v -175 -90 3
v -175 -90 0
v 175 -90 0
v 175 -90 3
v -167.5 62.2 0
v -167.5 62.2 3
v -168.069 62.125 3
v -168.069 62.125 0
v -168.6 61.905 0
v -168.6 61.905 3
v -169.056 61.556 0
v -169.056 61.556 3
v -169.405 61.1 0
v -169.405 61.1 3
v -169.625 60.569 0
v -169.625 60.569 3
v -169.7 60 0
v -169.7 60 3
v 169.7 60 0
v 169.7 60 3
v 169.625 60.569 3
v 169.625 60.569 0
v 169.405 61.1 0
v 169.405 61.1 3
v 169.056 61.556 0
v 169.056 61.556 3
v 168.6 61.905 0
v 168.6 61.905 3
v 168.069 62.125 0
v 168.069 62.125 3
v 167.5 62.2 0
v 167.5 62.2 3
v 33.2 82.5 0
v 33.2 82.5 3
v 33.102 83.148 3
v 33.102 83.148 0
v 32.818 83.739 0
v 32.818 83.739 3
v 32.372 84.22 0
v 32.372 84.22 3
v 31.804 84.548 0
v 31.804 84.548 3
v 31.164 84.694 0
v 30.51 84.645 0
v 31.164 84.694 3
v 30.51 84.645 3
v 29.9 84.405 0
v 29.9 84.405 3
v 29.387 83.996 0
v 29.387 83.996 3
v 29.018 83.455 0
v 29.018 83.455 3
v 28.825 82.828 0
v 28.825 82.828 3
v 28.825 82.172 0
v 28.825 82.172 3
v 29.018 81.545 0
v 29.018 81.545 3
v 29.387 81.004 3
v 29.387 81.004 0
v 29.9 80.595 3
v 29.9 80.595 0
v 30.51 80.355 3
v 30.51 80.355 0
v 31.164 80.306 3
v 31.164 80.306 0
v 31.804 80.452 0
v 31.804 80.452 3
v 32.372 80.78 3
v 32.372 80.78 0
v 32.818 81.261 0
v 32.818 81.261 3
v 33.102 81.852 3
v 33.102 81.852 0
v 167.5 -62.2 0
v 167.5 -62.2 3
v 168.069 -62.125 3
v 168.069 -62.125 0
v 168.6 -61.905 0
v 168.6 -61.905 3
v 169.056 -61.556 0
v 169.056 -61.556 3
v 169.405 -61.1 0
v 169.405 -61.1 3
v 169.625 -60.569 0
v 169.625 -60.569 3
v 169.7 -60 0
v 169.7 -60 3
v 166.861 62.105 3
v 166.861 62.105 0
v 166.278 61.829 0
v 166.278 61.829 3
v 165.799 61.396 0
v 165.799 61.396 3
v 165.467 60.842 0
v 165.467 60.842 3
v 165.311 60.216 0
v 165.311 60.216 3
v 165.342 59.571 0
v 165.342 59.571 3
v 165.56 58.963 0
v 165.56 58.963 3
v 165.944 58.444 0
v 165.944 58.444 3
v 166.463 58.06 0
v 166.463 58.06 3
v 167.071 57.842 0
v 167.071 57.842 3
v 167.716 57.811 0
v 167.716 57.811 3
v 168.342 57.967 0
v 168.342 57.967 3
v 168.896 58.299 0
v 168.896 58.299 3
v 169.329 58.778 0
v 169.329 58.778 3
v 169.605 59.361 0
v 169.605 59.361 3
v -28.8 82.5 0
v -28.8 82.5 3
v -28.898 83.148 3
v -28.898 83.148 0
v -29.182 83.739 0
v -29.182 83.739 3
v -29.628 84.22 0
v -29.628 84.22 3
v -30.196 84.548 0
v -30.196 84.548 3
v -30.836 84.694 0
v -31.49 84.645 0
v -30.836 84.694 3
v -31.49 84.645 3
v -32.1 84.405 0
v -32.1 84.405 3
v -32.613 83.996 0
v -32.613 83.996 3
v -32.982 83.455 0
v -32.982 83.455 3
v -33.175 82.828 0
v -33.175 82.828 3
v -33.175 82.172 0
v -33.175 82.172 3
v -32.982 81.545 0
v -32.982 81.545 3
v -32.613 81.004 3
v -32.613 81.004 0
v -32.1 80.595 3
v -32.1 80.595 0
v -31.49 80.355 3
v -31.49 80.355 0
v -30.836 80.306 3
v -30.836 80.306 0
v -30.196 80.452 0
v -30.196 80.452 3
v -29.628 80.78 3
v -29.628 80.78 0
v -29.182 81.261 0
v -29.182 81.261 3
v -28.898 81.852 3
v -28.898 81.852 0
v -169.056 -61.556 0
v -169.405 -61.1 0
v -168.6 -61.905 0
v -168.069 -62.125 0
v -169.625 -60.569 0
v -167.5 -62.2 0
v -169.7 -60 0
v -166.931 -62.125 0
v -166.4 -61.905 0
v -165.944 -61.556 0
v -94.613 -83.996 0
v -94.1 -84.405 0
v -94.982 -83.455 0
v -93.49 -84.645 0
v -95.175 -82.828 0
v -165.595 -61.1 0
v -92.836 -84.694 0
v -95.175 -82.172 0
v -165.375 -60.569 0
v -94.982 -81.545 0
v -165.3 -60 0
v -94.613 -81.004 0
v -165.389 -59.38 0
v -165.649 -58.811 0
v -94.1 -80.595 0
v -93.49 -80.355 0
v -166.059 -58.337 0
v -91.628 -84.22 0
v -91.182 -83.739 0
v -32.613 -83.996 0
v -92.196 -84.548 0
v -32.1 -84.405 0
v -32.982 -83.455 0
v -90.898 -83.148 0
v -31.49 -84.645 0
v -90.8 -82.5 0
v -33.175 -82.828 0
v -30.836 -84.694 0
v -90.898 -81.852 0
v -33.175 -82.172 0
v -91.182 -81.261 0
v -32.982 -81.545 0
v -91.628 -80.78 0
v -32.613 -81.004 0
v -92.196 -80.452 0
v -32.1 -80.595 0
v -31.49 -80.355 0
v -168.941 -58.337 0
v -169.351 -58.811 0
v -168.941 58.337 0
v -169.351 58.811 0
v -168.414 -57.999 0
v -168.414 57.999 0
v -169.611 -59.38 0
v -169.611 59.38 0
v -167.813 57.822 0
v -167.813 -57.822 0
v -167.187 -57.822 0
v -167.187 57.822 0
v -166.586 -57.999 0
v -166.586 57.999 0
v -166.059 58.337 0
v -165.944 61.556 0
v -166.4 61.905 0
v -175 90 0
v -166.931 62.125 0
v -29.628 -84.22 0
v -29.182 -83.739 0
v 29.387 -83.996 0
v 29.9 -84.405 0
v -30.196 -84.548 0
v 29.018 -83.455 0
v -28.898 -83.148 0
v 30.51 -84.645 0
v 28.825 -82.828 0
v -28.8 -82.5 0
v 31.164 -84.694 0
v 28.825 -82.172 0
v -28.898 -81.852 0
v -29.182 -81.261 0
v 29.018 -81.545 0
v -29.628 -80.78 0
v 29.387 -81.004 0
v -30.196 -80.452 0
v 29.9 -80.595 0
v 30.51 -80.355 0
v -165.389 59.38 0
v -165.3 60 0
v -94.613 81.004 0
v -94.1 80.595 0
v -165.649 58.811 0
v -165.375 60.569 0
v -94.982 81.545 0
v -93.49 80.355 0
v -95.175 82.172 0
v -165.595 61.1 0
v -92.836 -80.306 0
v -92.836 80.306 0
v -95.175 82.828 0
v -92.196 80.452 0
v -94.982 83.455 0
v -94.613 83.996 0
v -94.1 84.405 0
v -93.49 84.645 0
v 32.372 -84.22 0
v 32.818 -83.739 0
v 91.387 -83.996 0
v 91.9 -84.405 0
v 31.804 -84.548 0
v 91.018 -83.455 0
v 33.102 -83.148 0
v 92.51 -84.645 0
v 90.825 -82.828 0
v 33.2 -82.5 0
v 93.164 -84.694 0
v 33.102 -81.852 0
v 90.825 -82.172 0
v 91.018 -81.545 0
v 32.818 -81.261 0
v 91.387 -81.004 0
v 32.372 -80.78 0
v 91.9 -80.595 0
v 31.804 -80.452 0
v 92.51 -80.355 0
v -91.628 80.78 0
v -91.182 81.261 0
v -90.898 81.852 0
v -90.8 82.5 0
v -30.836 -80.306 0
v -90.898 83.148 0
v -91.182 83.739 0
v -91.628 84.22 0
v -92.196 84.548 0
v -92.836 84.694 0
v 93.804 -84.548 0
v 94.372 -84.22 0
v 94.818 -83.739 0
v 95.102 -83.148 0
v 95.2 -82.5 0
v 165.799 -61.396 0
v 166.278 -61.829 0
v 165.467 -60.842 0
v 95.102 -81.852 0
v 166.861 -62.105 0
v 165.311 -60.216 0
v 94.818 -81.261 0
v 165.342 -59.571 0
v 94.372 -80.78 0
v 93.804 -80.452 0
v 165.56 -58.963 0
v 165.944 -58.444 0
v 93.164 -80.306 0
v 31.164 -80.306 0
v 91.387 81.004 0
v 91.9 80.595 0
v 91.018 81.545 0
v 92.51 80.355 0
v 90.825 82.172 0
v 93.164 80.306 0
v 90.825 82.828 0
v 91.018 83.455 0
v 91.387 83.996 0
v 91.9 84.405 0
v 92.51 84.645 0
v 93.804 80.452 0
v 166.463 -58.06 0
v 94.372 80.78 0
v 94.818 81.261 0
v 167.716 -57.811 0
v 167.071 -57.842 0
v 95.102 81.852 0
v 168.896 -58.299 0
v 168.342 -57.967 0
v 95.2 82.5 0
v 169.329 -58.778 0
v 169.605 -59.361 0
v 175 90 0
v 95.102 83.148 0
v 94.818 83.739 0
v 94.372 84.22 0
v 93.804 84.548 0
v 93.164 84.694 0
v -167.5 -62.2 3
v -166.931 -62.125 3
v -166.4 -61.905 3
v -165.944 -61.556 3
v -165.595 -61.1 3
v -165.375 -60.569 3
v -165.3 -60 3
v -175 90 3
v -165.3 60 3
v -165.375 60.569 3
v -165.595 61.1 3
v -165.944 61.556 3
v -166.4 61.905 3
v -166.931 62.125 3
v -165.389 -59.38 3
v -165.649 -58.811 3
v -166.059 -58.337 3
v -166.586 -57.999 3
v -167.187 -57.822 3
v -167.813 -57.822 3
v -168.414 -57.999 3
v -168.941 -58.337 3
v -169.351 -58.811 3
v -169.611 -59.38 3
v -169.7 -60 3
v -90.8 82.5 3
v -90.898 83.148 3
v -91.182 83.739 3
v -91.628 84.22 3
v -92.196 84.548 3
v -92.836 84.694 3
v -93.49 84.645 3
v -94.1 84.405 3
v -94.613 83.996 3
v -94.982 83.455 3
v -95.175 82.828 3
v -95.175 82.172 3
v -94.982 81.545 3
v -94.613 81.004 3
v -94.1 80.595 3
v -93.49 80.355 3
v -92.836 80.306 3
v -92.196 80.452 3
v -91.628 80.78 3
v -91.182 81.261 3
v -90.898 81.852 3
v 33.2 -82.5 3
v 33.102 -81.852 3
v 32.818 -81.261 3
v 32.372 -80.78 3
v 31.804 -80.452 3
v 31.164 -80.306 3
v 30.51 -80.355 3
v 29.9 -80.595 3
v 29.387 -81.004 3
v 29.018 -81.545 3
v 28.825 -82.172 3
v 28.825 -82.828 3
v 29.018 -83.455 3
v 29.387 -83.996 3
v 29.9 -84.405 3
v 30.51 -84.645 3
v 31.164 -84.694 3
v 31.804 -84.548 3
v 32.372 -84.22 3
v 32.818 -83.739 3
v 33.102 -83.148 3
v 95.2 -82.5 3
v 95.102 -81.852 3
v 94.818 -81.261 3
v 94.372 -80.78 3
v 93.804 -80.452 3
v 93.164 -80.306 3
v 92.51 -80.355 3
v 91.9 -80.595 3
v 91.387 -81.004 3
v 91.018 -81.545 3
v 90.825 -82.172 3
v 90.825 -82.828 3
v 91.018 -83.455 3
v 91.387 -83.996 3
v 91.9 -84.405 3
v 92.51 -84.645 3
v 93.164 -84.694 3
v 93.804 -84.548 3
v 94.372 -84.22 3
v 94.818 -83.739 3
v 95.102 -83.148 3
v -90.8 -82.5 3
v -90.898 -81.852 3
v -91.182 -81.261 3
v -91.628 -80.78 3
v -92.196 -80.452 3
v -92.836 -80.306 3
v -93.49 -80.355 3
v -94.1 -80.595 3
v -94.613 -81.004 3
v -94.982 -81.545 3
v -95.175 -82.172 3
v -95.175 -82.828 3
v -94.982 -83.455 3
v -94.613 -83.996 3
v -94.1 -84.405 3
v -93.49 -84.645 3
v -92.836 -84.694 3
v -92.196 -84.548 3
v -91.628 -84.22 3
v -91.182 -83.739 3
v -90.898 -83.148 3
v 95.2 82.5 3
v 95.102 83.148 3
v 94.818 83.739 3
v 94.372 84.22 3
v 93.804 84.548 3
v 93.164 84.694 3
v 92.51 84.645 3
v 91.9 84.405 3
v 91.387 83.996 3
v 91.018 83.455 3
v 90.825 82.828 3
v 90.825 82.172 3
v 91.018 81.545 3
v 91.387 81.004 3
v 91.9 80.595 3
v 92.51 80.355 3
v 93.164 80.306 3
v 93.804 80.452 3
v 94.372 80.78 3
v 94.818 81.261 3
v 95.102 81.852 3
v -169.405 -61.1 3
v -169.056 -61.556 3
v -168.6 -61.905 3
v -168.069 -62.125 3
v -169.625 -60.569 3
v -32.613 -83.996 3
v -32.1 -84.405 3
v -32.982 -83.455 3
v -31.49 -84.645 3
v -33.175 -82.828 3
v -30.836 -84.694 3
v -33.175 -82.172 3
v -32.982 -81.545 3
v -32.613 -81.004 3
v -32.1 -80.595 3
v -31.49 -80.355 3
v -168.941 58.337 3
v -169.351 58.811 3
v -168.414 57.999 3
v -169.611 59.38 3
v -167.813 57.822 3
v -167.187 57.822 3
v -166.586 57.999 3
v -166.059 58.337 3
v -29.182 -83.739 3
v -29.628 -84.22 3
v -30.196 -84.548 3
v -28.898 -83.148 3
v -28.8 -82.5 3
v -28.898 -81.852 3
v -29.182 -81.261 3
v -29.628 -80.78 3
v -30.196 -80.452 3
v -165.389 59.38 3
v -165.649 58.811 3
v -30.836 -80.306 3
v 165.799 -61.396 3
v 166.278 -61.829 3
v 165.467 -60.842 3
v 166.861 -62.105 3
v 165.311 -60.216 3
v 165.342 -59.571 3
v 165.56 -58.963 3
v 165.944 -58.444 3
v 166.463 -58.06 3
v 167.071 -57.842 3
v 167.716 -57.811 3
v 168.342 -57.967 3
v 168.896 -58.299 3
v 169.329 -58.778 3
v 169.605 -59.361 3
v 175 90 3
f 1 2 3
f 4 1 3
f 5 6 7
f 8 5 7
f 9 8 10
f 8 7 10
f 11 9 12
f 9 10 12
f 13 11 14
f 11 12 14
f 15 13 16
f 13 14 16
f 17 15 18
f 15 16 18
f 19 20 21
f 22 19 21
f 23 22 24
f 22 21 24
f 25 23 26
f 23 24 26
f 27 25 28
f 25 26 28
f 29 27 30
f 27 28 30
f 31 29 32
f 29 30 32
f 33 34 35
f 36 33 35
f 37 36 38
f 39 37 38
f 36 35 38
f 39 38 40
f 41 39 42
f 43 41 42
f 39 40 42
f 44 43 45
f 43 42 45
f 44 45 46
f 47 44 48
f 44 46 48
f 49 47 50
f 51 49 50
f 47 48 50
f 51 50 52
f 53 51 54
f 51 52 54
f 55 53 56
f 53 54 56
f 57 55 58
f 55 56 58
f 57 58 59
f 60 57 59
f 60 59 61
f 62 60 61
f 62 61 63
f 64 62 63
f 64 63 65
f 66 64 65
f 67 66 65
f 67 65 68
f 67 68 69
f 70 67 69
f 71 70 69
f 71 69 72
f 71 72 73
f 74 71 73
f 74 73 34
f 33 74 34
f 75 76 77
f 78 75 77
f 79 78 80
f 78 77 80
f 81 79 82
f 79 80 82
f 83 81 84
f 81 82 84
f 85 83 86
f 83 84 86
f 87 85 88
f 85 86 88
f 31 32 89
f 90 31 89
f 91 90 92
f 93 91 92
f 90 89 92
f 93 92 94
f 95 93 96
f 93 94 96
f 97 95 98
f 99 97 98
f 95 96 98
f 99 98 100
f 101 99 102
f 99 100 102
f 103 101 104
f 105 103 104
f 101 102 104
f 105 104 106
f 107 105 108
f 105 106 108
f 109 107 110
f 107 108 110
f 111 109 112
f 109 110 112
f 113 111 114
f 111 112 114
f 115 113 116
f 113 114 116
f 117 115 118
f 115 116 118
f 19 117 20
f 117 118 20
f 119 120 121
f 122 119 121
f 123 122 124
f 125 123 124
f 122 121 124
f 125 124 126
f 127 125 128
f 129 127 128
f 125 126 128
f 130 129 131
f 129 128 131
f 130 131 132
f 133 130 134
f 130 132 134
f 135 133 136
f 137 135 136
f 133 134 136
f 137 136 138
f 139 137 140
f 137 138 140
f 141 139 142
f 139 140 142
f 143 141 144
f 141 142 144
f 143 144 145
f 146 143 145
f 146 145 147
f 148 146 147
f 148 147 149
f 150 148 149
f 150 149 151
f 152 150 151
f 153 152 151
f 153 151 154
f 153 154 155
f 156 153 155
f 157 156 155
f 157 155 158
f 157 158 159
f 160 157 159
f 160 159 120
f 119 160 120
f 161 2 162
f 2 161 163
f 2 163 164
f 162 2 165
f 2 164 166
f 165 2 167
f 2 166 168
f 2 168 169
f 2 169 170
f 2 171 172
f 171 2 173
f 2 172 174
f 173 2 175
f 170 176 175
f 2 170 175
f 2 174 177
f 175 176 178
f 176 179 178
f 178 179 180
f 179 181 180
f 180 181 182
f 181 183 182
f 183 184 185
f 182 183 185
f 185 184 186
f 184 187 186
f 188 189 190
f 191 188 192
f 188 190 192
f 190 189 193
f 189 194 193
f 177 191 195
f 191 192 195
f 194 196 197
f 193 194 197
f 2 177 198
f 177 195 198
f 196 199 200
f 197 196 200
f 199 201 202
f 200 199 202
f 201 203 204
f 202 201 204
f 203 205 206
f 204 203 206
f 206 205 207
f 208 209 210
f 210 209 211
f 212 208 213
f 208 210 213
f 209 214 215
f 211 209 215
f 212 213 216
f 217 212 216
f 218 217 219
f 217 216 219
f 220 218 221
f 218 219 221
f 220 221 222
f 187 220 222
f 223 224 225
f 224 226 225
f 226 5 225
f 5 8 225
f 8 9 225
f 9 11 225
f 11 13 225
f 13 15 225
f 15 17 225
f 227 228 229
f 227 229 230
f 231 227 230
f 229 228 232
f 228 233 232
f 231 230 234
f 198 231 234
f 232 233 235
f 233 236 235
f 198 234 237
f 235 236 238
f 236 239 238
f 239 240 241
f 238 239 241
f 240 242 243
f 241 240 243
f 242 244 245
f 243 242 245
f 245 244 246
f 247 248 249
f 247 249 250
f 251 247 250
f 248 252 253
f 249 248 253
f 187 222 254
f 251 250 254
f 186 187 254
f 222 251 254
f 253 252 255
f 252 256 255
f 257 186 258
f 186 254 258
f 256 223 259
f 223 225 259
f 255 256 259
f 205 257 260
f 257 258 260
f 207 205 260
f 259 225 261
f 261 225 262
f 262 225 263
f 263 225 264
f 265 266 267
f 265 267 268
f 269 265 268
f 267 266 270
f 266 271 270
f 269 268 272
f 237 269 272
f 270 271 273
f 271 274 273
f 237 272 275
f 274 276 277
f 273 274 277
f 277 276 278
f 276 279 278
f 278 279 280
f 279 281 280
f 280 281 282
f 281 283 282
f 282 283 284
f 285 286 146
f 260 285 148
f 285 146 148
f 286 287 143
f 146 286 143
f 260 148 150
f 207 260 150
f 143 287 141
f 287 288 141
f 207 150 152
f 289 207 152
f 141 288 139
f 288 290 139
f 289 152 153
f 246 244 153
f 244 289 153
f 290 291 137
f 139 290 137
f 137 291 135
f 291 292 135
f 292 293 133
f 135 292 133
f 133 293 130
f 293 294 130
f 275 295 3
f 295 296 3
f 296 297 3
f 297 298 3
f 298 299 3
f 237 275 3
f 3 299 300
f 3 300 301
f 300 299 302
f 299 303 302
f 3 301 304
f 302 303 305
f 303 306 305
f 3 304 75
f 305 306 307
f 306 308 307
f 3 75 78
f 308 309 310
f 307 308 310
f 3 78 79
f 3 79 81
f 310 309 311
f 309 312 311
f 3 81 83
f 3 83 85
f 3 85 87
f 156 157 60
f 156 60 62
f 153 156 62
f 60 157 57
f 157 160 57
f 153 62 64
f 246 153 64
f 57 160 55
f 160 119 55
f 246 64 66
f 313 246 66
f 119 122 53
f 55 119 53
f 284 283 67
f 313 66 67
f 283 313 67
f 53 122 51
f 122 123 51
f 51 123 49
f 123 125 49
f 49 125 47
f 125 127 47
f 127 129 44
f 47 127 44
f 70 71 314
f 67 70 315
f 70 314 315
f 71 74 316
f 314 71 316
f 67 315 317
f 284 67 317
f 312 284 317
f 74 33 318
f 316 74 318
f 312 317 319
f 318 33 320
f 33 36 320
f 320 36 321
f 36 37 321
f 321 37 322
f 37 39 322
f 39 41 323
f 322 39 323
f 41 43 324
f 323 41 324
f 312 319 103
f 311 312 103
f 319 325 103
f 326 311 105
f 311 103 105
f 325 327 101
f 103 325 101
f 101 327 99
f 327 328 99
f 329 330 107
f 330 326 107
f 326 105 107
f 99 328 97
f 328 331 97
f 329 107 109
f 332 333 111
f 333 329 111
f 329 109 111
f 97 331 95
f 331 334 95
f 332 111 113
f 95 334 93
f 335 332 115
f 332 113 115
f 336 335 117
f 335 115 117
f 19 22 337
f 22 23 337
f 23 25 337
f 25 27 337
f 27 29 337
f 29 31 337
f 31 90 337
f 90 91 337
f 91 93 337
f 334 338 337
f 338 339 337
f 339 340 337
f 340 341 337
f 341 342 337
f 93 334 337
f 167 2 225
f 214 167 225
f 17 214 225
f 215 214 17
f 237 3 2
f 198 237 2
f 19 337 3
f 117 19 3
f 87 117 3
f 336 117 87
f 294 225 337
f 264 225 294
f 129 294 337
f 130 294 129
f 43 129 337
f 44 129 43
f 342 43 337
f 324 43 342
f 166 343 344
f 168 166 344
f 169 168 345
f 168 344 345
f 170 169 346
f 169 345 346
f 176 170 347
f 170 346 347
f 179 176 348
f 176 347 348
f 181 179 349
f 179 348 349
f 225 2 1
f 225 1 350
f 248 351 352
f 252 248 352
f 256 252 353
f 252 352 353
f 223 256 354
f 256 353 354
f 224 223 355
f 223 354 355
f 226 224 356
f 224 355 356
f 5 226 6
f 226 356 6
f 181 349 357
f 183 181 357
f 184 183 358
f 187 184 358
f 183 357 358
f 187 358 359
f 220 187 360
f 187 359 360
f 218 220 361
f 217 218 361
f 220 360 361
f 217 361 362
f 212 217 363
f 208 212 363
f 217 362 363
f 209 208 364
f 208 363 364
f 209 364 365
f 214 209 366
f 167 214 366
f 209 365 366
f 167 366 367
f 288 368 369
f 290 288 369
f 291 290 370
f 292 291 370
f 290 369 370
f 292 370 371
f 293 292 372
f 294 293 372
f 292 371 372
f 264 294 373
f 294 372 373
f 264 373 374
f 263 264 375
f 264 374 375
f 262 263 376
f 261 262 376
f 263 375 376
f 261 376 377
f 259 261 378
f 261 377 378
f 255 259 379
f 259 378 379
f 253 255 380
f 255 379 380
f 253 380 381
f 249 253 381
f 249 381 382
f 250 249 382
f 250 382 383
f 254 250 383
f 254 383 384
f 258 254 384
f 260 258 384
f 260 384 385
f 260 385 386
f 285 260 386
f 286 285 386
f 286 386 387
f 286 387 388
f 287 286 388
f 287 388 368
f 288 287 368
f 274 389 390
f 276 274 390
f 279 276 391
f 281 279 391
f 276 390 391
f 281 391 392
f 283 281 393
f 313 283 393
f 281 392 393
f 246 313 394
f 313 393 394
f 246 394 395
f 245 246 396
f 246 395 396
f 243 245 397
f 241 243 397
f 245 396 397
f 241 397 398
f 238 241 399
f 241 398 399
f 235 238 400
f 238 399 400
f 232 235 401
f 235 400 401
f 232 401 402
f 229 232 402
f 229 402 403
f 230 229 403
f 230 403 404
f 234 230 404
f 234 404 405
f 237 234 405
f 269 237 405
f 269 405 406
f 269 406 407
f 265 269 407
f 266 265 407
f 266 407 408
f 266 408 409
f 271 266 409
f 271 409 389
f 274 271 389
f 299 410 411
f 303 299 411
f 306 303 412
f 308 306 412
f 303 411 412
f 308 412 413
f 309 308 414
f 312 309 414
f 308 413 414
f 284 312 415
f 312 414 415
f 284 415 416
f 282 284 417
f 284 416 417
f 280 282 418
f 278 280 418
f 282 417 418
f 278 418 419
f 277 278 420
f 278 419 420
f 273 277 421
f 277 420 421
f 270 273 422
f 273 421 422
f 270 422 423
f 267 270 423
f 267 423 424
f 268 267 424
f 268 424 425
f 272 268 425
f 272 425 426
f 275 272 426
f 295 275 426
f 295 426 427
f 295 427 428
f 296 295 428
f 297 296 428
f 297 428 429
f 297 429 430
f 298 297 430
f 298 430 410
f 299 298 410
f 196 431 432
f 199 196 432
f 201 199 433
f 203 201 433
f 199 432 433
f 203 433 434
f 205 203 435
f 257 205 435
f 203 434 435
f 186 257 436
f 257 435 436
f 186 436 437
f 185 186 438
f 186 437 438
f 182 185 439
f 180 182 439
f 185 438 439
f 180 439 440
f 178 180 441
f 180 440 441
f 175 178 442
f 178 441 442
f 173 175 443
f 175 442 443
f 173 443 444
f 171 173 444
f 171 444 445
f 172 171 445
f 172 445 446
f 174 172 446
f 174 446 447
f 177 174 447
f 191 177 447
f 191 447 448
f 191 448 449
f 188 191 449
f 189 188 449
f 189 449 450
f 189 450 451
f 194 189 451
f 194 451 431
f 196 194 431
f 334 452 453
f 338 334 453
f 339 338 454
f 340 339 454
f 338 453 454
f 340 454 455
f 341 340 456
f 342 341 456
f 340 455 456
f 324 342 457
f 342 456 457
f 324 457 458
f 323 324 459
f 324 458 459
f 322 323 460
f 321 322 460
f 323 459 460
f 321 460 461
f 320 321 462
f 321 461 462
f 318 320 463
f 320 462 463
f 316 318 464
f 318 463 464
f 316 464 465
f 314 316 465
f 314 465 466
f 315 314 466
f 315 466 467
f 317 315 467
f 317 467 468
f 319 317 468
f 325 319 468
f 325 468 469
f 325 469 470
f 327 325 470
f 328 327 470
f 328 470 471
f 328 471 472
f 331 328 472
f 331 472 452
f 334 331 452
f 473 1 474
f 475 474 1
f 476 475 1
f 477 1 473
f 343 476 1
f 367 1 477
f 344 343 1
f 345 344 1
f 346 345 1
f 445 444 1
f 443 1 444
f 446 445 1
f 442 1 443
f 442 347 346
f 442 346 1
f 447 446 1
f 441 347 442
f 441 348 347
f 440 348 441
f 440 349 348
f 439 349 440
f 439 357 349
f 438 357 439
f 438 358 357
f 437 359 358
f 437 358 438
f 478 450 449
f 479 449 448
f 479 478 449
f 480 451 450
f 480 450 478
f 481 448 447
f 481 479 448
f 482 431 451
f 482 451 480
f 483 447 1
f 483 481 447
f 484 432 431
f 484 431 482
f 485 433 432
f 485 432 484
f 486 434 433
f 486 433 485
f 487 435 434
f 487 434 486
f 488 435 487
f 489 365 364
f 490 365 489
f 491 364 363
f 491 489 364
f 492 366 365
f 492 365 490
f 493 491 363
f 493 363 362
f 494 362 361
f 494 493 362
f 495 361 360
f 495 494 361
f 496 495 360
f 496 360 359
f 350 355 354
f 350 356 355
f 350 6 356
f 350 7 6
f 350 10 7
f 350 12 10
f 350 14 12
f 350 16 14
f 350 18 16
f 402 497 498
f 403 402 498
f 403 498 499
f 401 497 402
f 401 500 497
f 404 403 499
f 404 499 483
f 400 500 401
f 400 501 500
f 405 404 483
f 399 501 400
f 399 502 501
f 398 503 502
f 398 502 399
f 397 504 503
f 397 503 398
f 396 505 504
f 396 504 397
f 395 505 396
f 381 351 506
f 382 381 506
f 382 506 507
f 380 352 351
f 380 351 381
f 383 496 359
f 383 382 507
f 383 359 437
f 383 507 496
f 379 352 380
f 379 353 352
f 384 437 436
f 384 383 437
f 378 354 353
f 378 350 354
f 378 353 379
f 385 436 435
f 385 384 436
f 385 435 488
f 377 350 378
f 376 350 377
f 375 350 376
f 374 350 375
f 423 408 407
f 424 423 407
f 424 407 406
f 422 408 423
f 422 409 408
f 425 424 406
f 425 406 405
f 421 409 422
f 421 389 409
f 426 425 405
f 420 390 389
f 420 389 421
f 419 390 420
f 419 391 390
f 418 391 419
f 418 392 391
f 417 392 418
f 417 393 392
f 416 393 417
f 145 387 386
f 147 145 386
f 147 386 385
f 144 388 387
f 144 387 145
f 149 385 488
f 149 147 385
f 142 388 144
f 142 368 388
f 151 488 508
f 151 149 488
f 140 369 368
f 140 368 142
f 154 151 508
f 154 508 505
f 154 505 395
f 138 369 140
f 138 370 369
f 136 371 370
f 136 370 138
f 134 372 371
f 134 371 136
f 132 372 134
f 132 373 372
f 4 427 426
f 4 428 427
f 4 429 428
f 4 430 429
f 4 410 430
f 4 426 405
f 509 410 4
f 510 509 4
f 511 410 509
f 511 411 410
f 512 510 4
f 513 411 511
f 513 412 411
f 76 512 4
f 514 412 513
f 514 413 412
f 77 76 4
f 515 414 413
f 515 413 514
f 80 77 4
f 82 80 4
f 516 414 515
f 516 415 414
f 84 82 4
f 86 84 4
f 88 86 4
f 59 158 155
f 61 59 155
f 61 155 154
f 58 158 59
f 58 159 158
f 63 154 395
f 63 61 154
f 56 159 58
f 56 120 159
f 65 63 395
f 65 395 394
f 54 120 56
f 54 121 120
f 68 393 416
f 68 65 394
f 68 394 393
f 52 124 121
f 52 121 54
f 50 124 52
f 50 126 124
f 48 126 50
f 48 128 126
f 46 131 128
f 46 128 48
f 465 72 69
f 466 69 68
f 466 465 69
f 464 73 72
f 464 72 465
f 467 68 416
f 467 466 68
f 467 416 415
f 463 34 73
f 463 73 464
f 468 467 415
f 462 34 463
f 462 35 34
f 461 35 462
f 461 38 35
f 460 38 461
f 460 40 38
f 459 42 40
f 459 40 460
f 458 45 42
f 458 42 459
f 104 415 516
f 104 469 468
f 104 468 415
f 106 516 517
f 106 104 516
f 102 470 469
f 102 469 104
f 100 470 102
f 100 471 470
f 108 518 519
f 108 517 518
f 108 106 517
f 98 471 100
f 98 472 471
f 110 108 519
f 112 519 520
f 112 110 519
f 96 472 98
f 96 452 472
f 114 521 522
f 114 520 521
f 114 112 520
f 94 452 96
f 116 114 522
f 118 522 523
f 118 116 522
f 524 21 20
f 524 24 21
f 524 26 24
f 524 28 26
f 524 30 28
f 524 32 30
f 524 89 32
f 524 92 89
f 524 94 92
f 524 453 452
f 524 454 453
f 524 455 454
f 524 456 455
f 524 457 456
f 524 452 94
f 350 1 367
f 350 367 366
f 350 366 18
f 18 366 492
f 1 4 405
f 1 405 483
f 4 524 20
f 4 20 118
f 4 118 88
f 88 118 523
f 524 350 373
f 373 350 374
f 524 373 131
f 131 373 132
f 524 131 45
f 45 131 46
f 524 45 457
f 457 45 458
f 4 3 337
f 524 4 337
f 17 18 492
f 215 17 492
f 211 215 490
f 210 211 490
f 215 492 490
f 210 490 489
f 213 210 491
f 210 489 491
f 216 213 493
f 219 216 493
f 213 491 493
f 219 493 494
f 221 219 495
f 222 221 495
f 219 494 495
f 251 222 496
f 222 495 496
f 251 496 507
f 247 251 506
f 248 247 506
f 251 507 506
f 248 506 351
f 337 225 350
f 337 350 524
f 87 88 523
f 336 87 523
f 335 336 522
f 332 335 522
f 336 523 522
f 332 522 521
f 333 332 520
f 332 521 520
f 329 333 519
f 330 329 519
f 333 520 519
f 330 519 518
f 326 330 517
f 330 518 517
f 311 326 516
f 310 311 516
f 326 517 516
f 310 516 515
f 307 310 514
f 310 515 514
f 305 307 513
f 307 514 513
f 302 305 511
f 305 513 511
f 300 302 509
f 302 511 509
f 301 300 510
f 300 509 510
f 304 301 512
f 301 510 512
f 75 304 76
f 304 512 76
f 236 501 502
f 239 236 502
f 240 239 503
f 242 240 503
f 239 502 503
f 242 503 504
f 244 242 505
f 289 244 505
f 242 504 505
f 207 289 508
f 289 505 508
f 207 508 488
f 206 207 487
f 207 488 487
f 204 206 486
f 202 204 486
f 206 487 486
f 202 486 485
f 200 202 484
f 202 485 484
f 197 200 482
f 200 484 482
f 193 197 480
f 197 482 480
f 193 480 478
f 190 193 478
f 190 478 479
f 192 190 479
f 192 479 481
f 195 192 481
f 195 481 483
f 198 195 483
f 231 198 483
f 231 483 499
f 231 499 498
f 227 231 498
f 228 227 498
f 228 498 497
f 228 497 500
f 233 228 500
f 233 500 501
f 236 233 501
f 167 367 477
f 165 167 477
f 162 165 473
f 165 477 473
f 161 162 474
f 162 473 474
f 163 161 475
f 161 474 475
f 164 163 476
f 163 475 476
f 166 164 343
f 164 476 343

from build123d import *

# Parameters (mm, degrees)
SKETCH_1_W          = 350
SKETCH_1_H          = 180
EXTRUDE_1_DEPTH     = 3
CUT_EXTRUDE_1_DEPTH = 140
SKETCH_3_R          = 2.2
CUT_EXTRUDE_2_DEPTH = 310
SKETCH_4_R          = 2.2
CUT_EXTRUDE_3_DEPTH = 310


with BuildPart() as part:
    # ｽｹｯﾁ1 → ﾎﾞｽ - 押し出し1 (new body)
    with BuildSketch(Plane.XY):
        Rectangle(SKETCH_1_W, SKETCH_1_H)
    extrude(amount=EXTRUDE_1_DEPTH)

    # ｽｹｯﾁ2 → ｶｯﾄ - 押し出し1 (cut)
    with BuildSketch(Plane.XY.offset(3)):
        with BuildLine():
            ThreePointArc((169.7, 60), (169.055634919, 61.555634919), (167.5, 62.2))
            Line((167.5, 62.2), (167.5, 60))
            Line((167.5, 60), (169.7, 60))
        make_face()
        with BuildLine():
            Line((167.5, 60), (167.5, 62.2))
            ThreePointArc((167.5, 62.2), (165.944365081, 58.444365081), (169.7, 60))
            Line((169.7, 60), (167.5, 60))
        make_face()
        with BuildLine():
            ThreePointArc((169.7, -60), (165.944365081, -58.444365081), (167.5, -62.2))
            Line((167.5, -62.2), (167.5, -60))
            Line((167.5, -60), (169.7, -60))
        make_face()
        with BuildLine():
            Line((167.5, -60), (167.5, -62.2))
            ThreePointArc((167.5, -62.2), (169.055634919, -61.555634919), (169.7, -60))
            Line((169.7, -60), (167.5, -60))
        make_face()
        with BuildLine():
            ThreePointArc((-165.3, 60), (-165.944365081, 61.555634919), (-167.5, 62.2))
            Line((-167.5, 62.2), (-167.5, 60))
            Line((-167.5, 60), (-169.7, 60))
            ThreePointArc((-169.7, 60), (-167.5, 57.8), (-165.3, 60))
        make_face()
        with BuildLine():
            Line((-167.5, 60), (-167.5, 62.2))
            ThreePointArc((-167.5, 62.2), (-169.055634919, 61.555634919), (-169.7, 60))
            Line((-169.7, 60), (-167.5, 60))
        make_face()
        with BuildLine():
            ThreePointArc((-169.7, -60), (-169.055634919, -61.555634919), (-167.5, -62.2))
            Line((-167.5, -62.2), (-167.5, -60))
            Line((-167.5, -60), (-169.7, -60))
        make_face()
        with BuildLine():
            Line((-167.5, -60), (-167.5, -62.2))
            ThreePointArc((-167.5, -62.2), (-165.944365081, -61.555634919), (-165.3, -60))
            ThreePointArc((-165.3, -60), (-167.5, -57.8), (-169.7, -60))
            Line((-169.7, -60), (-167.5, -60))
        make_face()
    extrude(amount=-CUT_EXTRUDE_1_DEPTH, mode=Mode.SUBTRACT)

    # ｽｹｯﾁ3 → ｶｯﾄ - 押し出し2 (cut)
    with BuildSketch(Plane.XY.offset(3)):
        with Locations((93, 82.5)):
            Circle(SKETCH_3_R)
        with Locations((31, 82.5)):
            Circle(SKETCH_3_R)
        with Locations((-31, 82.5)):
            Circle(SKETCH_3_R)
        with Locations((-93, 82.5)):
            Circle(SKETCH_3_R)
    extrude(amount=-CUT_EXTRUDE_2_DEPTH, mode=Mode.SUBTRACT)

    # ｽｹｯﾁ4 → ｶｯﾄ - 押し出し3 (cut)
    with BuildSketch(Plane.XY.offset(3)):
        with Locations((93, -82.5)):
            Circle(SKETCH_4_R)
        with Locations((31, -82.5)):
            Circle(SKETCH_4_R)
        with Locations((-31, -82.5)):
            Circle(SKETCH_4_R)
        with Locations((-93, -82.5)):
            Circle(SKETCH_4_R)
    extrude(amount=-CUT_EXTRUDE_3_DEPTH, mode=Mode.SUBTRACT)


solid = part.part
